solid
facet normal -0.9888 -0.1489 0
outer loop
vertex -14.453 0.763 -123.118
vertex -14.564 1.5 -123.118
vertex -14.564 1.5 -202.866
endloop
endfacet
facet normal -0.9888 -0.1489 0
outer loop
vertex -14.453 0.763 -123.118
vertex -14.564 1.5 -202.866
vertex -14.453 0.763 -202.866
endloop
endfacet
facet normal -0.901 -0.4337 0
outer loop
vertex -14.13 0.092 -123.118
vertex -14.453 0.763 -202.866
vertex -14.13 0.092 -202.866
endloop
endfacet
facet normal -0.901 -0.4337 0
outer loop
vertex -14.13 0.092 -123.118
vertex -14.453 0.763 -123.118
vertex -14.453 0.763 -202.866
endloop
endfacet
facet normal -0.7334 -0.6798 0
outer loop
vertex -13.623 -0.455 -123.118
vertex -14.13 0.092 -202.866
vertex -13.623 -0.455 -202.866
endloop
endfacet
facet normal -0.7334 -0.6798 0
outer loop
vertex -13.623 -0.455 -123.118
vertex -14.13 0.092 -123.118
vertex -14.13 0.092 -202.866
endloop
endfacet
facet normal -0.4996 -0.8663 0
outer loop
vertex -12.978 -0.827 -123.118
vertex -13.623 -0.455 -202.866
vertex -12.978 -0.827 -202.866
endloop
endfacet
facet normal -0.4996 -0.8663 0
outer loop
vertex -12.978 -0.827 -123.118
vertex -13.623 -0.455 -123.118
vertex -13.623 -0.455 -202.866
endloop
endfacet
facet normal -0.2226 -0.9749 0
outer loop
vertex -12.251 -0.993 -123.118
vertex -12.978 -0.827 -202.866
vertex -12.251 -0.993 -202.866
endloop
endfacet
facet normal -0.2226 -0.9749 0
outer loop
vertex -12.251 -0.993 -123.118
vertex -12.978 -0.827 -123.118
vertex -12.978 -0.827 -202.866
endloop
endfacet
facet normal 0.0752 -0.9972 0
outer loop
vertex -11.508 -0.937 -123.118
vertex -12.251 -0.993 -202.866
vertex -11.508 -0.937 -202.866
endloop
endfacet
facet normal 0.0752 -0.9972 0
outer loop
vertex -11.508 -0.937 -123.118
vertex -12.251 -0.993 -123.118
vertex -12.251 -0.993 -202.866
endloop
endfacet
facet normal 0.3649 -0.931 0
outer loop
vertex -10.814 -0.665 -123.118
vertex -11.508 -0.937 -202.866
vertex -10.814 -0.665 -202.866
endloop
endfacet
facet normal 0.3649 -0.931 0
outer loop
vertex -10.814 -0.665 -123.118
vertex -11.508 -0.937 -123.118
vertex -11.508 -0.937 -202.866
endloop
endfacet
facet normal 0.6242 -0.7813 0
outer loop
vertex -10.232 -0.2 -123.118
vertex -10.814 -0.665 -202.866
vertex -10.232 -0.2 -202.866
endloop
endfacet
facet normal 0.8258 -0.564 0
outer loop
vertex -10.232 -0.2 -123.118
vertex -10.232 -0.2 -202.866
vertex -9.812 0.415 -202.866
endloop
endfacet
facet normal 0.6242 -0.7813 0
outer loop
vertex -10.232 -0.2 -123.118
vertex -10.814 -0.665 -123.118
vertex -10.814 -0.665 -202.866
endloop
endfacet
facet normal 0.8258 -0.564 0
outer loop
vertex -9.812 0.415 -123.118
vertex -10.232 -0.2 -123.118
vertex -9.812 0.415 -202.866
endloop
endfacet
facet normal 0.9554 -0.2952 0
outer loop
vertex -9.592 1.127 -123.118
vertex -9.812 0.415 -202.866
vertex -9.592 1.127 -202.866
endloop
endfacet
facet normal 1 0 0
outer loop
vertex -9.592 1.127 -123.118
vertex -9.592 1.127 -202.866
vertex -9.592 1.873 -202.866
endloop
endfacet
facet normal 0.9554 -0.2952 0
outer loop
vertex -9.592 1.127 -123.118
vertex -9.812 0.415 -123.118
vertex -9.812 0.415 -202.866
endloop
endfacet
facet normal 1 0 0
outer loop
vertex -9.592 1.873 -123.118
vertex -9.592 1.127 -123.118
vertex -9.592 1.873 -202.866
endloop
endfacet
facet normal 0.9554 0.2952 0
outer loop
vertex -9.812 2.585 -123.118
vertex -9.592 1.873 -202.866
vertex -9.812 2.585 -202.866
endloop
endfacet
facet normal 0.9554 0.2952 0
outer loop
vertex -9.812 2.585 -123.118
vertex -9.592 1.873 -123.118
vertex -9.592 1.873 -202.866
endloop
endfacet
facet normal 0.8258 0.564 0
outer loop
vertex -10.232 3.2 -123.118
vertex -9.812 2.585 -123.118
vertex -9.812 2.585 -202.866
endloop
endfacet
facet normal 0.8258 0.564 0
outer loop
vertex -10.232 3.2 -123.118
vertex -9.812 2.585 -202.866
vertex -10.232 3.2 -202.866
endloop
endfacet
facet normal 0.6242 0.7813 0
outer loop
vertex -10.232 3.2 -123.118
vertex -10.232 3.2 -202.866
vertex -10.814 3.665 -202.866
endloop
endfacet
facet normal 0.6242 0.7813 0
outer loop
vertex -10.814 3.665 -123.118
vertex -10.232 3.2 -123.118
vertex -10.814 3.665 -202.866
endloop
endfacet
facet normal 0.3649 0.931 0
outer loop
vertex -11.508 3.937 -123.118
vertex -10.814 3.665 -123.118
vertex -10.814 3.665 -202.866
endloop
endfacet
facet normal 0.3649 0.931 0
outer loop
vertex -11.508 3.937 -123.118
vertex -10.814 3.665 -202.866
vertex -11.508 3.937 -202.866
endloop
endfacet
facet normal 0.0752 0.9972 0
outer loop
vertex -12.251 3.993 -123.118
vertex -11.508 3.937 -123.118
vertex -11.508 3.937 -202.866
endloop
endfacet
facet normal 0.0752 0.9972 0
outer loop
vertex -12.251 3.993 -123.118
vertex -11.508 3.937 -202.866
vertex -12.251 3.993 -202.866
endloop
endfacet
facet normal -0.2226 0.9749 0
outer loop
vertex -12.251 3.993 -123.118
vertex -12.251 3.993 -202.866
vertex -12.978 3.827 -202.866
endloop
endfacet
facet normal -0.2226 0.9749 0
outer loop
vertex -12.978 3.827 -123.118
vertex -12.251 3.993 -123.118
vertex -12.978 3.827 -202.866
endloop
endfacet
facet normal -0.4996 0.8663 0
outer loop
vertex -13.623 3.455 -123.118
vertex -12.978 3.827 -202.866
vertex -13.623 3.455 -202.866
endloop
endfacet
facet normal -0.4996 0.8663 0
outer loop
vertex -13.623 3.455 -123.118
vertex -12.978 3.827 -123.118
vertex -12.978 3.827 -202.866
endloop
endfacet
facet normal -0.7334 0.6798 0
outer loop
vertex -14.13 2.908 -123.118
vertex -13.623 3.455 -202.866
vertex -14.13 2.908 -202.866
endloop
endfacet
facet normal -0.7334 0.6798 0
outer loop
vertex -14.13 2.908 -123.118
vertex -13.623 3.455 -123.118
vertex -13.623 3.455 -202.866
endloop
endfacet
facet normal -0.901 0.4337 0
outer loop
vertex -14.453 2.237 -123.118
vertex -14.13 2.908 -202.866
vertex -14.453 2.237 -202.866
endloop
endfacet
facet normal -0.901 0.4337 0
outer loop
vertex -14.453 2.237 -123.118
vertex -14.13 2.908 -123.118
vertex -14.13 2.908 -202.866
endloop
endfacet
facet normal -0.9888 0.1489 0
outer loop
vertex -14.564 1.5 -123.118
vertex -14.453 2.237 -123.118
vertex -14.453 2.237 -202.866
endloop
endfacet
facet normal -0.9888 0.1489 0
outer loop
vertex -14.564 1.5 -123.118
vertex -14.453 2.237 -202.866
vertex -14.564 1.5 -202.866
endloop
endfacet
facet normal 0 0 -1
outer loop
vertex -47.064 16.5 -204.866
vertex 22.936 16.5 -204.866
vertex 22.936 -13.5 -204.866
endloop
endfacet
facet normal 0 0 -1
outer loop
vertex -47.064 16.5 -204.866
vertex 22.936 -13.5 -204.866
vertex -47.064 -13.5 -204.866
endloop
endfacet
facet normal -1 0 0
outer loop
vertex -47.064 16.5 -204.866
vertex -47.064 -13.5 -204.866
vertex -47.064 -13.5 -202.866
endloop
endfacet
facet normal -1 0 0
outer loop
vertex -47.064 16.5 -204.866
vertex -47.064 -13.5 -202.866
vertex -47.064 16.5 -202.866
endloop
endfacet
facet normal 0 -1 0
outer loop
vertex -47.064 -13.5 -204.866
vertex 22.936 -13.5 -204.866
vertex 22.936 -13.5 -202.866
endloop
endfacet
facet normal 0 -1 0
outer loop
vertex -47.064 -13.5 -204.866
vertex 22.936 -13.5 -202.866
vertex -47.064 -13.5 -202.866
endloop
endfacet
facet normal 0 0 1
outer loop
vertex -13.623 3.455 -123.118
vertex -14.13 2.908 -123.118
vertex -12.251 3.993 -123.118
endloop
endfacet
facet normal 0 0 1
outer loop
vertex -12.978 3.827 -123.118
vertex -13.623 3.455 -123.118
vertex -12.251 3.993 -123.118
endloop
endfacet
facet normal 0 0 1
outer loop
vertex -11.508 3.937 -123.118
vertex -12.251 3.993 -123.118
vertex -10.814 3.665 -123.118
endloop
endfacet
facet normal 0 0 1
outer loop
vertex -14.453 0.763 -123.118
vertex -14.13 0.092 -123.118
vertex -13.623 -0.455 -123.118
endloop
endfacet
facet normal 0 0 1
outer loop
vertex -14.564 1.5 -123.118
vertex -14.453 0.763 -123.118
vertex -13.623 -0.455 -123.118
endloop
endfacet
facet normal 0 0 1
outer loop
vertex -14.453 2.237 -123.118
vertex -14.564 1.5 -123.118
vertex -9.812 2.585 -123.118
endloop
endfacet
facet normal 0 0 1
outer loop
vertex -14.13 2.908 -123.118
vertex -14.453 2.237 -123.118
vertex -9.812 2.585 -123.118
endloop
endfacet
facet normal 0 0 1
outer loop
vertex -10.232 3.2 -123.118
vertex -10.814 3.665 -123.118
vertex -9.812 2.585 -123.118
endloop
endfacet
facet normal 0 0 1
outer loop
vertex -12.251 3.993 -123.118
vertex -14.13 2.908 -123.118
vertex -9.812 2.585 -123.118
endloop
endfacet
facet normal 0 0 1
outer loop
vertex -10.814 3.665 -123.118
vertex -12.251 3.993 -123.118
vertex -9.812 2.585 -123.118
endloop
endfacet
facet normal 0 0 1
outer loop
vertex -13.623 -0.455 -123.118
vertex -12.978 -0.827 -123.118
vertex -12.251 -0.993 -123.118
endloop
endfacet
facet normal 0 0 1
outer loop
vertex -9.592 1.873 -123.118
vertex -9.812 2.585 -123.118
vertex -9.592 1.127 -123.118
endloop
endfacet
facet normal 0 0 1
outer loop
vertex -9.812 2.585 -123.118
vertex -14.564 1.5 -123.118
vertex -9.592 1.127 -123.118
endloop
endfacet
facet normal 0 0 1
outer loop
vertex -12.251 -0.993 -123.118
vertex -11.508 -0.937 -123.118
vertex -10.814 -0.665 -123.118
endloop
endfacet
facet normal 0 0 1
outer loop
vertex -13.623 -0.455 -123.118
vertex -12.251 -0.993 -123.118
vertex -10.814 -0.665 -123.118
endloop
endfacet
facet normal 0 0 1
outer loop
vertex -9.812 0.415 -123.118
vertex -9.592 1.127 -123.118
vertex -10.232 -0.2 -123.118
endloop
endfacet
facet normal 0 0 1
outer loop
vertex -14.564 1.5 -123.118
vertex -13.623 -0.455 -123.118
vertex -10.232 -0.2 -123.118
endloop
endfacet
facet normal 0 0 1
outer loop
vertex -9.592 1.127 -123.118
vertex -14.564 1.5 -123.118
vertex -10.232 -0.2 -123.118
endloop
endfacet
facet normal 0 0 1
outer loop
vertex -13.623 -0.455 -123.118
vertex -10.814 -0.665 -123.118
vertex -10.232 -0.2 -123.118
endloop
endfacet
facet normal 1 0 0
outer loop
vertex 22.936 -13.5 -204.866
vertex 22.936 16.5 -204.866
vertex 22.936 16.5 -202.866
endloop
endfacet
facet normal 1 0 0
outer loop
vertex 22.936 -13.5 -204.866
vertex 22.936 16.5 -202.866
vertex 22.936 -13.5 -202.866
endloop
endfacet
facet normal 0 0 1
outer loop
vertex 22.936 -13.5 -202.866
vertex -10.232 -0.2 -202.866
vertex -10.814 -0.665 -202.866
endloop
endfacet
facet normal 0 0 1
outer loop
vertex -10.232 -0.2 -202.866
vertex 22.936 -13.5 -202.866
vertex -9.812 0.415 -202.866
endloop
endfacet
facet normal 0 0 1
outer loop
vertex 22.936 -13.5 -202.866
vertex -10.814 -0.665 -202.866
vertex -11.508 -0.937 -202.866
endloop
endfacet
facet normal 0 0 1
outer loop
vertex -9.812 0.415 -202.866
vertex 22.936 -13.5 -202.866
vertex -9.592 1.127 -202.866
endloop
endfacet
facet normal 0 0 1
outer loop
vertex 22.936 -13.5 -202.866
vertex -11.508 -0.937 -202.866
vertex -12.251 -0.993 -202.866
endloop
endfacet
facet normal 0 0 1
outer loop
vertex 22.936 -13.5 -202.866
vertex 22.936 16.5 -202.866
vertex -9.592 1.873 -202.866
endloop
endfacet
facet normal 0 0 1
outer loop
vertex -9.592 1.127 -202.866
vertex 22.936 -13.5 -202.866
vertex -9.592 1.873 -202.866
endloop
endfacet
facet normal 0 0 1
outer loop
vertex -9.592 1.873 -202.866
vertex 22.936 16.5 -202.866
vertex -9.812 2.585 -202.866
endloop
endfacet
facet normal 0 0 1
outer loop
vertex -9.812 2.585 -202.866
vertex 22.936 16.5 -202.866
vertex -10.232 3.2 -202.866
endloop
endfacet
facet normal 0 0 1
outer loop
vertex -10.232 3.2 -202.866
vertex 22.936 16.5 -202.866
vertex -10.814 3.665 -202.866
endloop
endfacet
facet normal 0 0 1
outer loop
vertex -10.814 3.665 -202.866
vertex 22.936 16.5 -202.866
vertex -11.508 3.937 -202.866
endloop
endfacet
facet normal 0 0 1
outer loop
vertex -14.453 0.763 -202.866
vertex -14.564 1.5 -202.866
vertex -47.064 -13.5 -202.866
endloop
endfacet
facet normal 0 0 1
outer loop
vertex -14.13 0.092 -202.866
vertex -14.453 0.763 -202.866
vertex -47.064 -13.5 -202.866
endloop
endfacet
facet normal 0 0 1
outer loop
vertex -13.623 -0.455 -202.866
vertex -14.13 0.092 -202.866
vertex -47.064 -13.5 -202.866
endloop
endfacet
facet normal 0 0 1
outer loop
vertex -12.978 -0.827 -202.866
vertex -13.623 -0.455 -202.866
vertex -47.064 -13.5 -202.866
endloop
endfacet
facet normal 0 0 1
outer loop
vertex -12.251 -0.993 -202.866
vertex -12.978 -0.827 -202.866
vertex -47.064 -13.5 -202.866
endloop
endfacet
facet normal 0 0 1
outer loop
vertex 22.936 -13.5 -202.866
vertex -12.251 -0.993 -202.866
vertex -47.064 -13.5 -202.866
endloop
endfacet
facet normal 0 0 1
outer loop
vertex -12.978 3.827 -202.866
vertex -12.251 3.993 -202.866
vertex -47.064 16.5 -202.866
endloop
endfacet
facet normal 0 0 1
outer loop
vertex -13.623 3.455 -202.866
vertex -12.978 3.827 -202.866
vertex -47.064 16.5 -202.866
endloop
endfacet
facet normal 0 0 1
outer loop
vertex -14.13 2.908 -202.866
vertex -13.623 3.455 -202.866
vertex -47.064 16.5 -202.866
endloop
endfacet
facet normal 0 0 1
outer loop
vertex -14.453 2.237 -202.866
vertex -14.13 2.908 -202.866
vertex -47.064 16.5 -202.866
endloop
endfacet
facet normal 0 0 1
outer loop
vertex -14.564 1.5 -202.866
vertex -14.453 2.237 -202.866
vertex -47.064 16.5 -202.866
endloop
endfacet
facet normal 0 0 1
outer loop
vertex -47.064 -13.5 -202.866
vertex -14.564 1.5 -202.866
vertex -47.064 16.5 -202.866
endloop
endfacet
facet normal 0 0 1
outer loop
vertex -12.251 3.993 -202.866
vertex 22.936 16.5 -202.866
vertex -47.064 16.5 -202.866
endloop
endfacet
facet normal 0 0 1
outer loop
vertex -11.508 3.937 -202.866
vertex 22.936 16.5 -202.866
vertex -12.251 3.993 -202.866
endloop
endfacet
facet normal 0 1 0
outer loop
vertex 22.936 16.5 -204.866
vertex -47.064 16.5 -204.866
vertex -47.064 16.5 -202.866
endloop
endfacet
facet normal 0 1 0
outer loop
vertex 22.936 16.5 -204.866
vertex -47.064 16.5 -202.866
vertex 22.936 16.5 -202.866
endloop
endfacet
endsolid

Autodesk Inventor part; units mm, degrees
ref_plane "YZ Plane" through (0, 0, 0) normal (1, 0, 0) x (0, 1, 0)
ref_plane "XZ Plane" through (0, 0, 0) normal (0, 1, 0) x (-1, 0, 0)
ref_plane "XY Plane" through (0, 0, 0) normal (0, 0, 1) x (1, 0, 0)
sketch "Skizze1" plane through (0, 0, 0) normal (0, 1, 0) x (-1, 0, 0)
  line L0 (35.5112, -88.3128) -> (35.5112, -108.3128)
  line L1 (35.5112, -108.3128) -> (22.0645, -123.1178)
  line L2 (22.0645, -123.1178) -> (2.0645, -123.1178)
  line L3 (2.0645, -123.1178) -> (-12.7404, -109.6711)
  line L4 (-12.7404, -109.6711) -> (-12.7404, -89.6711)
  line L5 (-12.7404, -89.6711) -> (0.7063, -74.8661)
  line L6 (0.7063, -74.8661) -> (20.7063, -74.8661)
  line L7 (20.7063, -74.8661) -> (35.5112, -88.3128)
  point P0 (0, 0)
  dimension "d0" = 20
  dimension "d1" = 20
  dimension "d2" = 20
  dimension "d3" = 20
  dimension "d4" = 20
  dimension "d5" = 20
  dimension "d6" = 20
  dimension "d7" = 20
extrude "Extrusion1" add sketch "Skizze1" along normal blind 3
sketch "Skizze2" plane through (-2.0645, 0, -123.1178) normal (0, 0, -1) x (-1, 0, 0)
  circle A0 centre (10, 1.5) radius 2.5
  line L0 (0, 3) -> (20, 3) projected
  point P0 (-2.0645, 0)
  dimension "d11" = 5
  dimension "d12" = 1.5
extrude "Extrusion2" add sketch "Skizze2" along normal blind 81.748
sketch "Skizze3" plane through (-12.0645, 1.5, -204.8658) normal (0, 0, -1) x (-1, 0, 0)
  line L0 (-35, -15) -> (35, -15)
  line L1 (35, -15) -> (35, 15)
  line L2 (35, 15) -> (-35, 15)
  line L3 (-35, 15) -> (-35, -15)
  arc A0 (2, -1.5) -> (-2, -1.5) centre (0, 0) ccw projected
  line L4 (-35, -15) -> (35, 15) construction
  line L5 (35, -15) -> (-35, 15) construction
  point P0 (-12.0645, -1.5)
  point P1 (-2, 1.5)
  point P2 (0, -2.5)
  point P3 (0, 2.5)
  dimension "d15" = 70
  dimension "d16" = 30
extrude "Extrusion3" add sketch "Skizze3" against normal blind 2
sketch "Skizze5" plane through (0, 0, 0) normal (0, -1, 0) x (1, 0, 0)
  line L0 (-22.0645, -123.1178) -> (51.5086, -123.1178)
  line L1 (51.5086, -123.1178) -> (51.5086, -51.2705)
  line L2 (51.5086, -51.2705) -> (-22.0645, -51.2705)
  line L3 (-22.0645, -51.2705) -> (-22.0645, -123.1178)
  line L4 (-22.0645, -51.2705) -> (-54.8687, -51.2705)
  line L5 (-54.8687, -51.2705) -> (-54.8687, -123.1178)
  line L6 (-54.8687, -123.1178) -> (-22.0645, -123.1178)
  line L7 (-22.0645, -123.1178) -> (-22.0645, -51.2705)
  point P0 (0, 0)
extrude "Extrusion5" cut sketch "Skizze5" against normal blind 10
properties part number "Stoppschild_Teil_Unten"
